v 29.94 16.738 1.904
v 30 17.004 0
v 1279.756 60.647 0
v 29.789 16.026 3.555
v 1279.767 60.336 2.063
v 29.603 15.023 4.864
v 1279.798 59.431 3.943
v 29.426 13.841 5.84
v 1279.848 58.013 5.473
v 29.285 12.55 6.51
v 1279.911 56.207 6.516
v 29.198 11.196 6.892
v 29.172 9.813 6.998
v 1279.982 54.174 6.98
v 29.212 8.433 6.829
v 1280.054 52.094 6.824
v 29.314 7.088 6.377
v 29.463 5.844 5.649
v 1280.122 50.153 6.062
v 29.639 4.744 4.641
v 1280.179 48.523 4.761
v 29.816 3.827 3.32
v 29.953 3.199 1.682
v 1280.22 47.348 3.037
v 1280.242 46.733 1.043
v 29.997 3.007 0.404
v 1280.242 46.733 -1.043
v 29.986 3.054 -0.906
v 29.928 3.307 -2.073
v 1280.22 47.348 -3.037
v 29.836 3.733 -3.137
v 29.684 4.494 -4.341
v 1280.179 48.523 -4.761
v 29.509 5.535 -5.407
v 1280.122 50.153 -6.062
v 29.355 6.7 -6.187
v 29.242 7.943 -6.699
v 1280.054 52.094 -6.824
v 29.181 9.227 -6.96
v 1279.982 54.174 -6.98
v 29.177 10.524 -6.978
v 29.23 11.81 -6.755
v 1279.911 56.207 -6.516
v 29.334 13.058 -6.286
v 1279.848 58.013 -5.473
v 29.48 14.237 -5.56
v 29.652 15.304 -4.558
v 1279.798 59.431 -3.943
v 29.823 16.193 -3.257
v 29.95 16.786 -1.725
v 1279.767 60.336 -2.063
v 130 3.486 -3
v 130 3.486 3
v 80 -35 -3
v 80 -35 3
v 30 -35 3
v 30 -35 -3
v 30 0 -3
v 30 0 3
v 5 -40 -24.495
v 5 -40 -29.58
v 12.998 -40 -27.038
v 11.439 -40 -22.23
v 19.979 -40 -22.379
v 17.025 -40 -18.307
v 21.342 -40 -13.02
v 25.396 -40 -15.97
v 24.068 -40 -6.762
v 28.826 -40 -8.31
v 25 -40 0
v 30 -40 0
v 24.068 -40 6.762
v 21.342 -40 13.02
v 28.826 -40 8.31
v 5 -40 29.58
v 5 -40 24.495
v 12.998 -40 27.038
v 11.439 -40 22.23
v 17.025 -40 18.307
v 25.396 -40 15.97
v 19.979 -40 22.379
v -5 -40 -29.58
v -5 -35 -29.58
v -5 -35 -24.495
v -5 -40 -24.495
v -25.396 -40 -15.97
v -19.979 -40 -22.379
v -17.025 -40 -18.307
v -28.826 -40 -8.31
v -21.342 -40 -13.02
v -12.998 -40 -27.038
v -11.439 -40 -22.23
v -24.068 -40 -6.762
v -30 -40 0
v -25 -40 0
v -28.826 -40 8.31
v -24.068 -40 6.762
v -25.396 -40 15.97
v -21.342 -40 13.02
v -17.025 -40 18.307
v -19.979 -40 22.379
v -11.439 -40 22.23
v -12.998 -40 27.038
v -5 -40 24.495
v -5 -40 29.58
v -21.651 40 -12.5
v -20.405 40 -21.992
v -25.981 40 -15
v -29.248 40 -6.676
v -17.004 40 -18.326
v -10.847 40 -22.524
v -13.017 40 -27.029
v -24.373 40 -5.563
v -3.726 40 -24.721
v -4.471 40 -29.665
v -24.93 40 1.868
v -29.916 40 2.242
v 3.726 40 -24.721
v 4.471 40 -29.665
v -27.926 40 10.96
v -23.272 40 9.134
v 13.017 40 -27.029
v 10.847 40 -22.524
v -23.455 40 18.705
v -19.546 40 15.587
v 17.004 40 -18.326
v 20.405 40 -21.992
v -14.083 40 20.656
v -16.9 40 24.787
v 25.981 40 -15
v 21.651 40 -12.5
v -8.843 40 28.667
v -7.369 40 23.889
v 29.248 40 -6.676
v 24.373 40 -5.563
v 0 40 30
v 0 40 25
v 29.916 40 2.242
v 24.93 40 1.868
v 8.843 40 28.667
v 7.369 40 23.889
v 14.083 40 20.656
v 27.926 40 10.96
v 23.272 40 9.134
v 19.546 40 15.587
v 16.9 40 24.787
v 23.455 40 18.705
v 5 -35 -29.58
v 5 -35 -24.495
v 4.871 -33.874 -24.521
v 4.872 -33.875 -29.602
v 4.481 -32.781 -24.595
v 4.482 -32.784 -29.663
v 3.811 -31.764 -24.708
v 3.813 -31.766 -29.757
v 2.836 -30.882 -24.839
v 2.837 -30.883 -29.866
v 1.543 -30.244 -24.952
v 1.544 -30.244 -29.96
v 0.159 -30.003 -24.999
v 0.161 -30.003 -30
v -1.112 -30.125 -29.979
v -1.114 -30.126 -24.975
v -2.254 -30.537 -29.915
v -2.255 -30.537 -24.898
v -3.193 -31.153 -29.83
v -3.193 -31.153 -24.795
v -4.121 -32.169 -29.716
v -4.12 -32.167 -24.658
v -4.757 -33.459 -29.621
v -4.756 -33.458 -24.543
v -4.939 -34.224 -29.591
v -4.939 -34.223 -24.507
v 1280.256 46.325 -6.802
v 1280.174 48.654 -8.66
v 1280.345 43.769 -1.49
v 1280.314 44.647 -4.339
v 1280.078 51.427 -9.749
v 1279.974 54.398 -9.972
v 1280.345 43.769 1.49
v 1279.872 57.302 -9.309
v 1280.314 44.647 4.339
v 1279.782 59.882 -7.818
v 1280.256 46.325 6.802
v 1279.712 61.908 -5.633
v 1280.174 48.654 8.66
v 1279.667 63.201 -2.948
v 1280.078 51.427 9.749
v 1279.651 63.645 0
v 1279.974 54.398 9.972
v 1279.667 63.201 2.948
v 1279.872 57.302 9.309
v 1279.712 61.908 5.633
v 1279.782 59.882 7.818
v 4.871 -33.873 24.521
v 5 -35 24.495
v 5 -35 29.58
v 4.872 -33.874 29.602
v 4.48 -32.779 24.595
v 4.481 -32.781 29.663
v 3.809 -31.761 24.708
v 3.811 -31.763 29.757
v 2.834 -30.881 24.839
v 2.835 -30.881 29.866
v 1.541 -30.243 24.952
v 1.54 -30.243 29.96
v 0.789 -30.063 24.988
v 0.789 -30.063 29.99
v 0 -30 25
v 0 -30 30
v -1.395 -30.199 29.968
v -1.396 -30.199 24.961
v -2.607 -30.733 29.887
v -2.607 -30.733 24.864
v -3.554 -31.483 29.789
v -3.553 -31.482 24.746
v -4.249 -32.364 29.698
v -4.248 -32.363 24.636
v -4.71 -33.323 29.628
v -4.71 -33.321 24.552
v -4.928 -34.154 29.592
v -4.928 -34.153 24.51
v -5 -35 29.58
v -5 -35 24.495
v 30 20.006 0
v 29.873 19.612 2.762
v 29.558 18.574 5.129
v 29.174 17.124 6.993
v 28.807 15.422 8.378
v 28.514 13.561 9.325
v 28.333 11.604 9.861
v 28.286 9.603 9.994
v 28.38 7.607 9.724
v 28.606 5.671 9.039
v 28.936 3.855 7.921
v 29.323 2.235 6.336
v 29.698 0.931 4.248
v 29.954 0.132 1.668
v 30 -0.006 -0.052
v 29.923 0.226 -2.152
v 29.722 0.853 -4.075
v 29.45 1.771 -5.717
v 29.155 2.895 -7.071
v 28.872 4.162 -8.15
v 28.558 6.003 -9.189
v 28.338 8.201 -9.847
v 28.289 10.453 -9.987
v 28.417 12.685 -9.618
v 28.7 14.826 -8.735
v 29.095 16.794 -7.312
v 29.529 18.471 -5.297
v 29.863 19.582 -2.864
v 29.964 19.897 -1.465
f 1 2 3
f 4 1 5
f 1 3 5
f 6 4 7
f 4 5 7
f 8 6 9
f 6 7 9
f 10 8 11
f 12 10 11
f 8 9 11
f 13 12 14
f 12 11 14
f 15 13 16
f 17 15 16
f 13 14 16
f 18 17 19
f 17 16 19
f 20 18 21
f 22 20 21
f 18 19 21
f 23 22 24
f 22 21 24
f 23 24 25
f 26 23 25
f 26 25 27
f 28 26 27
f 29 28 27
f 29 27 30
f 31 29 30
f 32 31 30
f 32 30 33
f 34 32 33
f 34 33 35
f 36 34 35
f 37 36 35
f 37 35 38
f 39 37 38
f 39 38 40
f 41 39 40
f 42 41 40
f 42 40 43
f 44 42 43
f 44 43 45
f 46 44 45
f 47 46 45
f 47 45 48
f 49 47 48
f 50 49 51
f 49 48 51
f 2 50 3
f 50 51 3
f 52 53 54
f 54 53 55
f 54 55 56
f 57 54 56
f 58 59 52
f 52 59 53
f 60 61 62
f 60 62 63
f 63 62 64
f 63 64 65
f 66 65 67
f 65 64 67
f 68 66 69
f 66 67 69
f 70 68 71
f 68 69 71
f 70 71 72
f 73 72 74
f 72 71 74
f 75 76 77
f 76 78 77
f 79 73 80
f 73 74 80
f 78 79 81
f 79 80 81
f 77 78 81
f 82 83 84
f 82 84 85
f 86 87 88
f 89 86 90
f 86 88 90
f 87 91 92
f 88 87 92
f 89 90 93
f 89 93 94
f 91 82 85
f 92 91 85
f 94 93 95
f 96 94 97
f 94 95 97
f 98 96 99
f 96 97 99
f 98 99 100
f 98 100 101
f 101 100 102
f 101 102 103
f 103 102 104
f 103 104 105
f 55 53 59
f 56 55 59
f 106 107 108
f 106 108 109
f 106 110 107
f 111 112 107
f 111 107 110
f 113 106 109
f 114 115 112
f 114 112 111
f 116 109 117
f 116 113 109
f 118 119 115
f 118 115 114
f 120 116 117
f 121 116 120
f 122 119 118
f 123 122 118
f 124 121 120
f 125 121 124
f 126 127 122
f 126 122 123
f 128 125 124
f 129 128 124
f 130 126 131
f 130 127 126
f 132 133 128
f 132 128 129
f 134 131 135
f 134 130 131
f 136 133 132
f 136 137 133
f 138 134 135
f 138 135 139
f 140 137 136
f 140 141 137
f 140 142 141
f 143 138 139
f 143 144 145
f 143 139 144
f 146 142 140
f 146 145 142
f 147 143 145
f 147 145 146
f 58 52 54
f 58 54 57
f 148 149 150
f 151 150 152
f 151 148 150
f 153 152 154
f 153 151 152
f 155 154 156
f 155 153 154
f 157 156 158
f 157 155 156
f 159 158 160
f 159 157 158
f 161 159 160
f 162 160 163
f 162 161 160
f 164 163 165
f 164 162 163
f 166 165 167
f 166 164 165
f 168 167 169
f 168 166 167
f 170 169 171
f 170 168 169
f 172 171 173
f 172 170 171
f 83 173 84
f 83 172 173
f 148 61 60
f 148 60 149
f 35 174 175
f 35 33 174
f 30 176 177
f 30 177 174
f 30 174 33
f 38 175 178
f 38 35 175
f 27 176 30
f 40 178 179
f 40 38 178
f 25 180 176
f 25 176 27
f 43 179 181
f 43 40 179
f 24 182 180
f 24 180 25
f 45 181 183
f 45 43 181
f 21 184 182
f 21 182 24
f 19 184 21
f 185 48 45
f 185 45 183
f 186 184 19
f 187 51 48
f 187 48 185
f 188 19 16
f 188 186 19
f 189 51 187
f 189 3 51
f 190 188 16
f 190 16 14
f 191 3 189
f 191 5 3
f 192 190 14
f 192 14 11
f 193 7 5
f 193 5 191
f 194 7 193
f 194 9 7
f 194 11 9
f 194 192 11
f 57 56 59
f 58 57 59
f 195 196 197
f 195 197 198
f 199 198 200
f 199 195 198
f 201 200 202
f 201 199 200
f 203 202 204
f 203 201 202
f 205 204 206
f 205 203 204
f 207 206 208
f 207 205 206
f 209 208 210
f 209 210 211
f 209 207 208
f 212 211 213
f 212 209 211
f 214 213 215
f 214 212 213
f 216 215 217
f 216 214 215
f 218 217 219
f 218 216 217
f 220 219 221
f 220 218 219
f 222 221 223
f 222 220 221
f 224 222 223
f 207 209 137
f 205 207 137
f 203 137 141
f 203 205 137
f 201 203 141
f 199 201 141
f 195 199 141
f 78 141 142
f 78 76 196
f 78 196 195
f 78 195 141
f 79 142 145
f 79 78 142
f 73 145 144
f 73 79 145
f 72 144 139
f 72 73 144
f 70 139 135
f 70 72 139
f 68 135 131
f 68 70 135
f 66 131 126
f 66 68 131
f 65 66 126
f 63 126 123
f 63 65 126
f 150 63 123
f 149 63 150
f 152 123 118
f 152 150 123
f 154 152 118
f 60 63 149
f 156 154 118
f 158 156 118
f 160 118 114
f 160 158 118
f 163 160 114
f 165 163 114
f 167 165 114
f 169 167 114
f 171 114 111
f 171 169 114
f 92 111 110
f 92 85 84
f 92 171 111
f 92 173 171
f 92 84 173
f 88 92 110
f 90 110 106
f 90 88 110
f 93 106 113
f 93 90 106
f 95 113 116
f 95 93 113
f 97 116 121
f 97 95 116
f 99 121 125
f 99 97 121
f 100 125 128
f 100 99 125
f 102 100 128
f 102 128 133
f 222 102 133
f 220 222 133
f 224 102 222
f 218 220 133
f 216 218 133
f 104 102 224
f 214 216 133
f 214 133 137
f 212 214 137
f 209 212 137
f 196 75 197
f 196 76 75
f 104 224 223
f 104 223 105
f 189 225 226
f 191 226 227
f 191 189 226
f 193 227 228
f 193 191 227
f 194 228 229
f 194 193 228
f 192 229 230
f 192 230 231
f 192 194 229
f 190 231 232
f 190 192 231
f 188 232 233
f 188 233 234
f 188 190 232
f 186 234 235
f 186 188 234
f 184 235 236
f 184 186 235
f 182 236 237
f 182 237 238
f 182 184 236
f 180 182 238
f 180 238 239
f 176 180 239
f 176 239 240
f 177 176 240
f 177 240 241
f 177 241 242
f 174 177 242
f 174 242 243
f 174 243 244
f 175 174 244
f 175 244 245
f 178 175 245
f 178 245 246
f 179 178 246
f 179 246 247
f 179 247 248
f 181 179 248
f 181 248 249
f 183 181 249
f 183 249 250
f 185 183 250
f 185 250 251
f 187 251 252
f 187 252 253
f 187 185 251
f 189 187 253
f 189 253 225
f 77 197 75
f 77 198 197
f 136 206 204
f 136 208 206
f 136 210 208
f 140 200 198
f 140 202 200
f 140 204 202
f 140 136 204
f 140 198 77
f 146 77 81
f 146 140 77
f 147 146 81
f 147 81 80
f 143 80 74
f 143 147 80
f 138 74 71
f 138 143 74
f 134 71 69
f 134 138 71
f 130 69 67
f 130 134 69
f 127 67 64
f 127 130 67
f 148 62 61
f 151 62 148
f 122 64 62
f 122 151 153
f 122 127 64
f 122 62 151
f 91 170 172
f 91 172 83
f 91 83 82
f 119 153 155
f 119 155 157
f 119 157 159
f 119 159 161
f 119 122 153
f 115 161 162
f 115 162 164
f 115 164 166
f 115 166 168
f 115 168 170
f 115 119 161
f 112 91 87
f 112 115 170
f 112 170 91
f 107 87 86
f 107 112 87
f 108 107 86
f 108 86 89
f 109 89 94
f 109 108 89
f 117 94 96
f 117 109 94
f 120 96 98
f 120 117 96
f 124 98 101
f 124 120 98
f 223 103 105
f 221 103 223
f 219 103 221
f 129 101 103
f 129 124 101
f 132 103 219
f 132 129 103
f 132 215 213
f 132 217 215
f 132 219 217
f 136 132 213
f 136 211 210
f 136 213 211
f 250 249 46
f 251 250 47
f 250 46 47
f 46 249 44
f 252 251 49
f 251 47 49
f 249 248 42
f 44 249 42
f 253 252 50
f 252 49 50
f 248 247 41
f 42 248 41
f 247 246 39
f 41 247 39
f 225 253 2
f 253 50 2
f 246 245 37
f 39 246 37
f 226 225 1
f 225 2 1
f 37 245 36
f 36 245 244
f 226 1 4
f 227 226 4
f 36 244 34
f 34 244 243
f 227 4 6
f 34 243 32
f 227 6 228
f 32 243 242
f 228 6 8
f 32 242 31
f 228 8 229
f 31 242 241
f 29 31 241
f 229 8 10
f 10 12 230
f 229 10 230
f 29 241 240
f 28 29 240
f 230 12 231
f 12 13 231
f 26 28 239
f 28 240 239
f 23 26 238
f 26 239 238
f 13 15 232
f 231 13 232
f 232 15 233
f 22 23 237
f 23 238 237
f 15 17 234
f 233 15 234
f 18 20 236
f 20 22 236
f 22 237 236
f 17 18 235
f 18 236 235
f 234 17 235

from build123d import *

# Parameters (mm, degrees)
SKETCH_1_R               = 30
SKETCH_1_R_2             = 25
EXTRUDE_1_DEPTH          = 40
EXTRUDE_2_REACH          = 1315.686
EXTRUDE_2_END_RADIUS     = 30
SKETCH_3_R               = 10
SKETCH_3_R_2             = 7
EXTRUDE_3_DEPTH          = 3
CUT_EXTRUDE_1_DEPTH      = 1283.280865753
CUT_EXTRUDE_1_DEPTH_BACK = 1283.280865753


with BuildPart() as part:
    # Эскиз1 → Бобышка-Вытянуть1 (new, symmetric)
    with BuildSketch(Plane(origin=(0, 0, 0), x_dir=(1, 0, 0), z_dir=(0, 1, 0))):
        with Locations(Location((0, 0, 0), (0, 0, 270))):
            Circle(SKETCH_1_R)
        with Locations(Location((0, 0, 0), (0, 0, 270))):
            Circle(SKETCH_1_R_2, mode=Mode.SUBTRACT)
    extrude(amount=EXTRUDE_1_DEPTH, both=True)

    # Эскиз5 → Вырез-Вытянуть1 (cut, two sides: drawn at the far end of the back side and taken through both)
    with BuildSketch(Plane.XY.offset(-CUT_EXTRUDE_1_DEPTH_BACK)):
        with BuildLine():
            Line((-5, -35), (-5, -62))
            Line((-5, -62), (5, -62))
            Line((5, -62), (5, -35))
            ThreePointArc((5, -35), (0, -30), (-5, -35))
        make_face()
    extrude(amount=CUT_EXTRUDE_1_DEPTH + CUT_EXTRUDE_1_DEPTH_BACK, mode=Mode.SUBTRACT)


with BuildPart() as body_2:
    # Бобышка-Вытянуть2: up to this cylinder (the profile starts outside it)
    extrude_2_end = Plane(origin=(0, 43.939724, 0), z_dir=(0, -1, 0)) * Cylinder(EXTRUDE_2_END_RADIUS, 2692.372, mode=Mode.PRIVATE)
    # Эскиз3 → Бобышка-Вытянуть2 (new, up to the surface)
    with BuildSketch(Plane(origin=(1280, 53.650961865, 0), x_dir=(0, 0, -1), z_dir=(0.999390827019096, 0.03489949670249754, 0)), mode=Mode.PRIVATE) as extrude_2_sk1:
        with Locations(Location((0, 0, 0), (0, 0, 90))):
            Circle(SKETCH_3_R)
        with Locations(Location((0, 0, 0), (0, 0, 90))):
            Circle(SKETCH_3_R_2, mode=Mode.SUBTRACT)
    extrude_2_tool1 = extrude(extrude_2_sk1.sketch, amount=-EXTRUDE_2_REACH, mode=Mode.PRIVATE) - extrude_2_end
    add(extrude_2_tool1.solids().sort_by_distance((1280.339124, 43.939724, 0))[0])


with BuildPart() as body_3:
    # Эскиз4 → Бобышка-Вытянуть3 (new, symmetric)
    with BuildSketch(Plane.XY):
        Polygon((30, -35), (30, 0), (130, 3.485981506), (80, -35), align=None)
    extrude(amount=EXTRUDE_3_DEPTH, both=True)


solid = Compound([part.part, body_2.part, body_3.part])
